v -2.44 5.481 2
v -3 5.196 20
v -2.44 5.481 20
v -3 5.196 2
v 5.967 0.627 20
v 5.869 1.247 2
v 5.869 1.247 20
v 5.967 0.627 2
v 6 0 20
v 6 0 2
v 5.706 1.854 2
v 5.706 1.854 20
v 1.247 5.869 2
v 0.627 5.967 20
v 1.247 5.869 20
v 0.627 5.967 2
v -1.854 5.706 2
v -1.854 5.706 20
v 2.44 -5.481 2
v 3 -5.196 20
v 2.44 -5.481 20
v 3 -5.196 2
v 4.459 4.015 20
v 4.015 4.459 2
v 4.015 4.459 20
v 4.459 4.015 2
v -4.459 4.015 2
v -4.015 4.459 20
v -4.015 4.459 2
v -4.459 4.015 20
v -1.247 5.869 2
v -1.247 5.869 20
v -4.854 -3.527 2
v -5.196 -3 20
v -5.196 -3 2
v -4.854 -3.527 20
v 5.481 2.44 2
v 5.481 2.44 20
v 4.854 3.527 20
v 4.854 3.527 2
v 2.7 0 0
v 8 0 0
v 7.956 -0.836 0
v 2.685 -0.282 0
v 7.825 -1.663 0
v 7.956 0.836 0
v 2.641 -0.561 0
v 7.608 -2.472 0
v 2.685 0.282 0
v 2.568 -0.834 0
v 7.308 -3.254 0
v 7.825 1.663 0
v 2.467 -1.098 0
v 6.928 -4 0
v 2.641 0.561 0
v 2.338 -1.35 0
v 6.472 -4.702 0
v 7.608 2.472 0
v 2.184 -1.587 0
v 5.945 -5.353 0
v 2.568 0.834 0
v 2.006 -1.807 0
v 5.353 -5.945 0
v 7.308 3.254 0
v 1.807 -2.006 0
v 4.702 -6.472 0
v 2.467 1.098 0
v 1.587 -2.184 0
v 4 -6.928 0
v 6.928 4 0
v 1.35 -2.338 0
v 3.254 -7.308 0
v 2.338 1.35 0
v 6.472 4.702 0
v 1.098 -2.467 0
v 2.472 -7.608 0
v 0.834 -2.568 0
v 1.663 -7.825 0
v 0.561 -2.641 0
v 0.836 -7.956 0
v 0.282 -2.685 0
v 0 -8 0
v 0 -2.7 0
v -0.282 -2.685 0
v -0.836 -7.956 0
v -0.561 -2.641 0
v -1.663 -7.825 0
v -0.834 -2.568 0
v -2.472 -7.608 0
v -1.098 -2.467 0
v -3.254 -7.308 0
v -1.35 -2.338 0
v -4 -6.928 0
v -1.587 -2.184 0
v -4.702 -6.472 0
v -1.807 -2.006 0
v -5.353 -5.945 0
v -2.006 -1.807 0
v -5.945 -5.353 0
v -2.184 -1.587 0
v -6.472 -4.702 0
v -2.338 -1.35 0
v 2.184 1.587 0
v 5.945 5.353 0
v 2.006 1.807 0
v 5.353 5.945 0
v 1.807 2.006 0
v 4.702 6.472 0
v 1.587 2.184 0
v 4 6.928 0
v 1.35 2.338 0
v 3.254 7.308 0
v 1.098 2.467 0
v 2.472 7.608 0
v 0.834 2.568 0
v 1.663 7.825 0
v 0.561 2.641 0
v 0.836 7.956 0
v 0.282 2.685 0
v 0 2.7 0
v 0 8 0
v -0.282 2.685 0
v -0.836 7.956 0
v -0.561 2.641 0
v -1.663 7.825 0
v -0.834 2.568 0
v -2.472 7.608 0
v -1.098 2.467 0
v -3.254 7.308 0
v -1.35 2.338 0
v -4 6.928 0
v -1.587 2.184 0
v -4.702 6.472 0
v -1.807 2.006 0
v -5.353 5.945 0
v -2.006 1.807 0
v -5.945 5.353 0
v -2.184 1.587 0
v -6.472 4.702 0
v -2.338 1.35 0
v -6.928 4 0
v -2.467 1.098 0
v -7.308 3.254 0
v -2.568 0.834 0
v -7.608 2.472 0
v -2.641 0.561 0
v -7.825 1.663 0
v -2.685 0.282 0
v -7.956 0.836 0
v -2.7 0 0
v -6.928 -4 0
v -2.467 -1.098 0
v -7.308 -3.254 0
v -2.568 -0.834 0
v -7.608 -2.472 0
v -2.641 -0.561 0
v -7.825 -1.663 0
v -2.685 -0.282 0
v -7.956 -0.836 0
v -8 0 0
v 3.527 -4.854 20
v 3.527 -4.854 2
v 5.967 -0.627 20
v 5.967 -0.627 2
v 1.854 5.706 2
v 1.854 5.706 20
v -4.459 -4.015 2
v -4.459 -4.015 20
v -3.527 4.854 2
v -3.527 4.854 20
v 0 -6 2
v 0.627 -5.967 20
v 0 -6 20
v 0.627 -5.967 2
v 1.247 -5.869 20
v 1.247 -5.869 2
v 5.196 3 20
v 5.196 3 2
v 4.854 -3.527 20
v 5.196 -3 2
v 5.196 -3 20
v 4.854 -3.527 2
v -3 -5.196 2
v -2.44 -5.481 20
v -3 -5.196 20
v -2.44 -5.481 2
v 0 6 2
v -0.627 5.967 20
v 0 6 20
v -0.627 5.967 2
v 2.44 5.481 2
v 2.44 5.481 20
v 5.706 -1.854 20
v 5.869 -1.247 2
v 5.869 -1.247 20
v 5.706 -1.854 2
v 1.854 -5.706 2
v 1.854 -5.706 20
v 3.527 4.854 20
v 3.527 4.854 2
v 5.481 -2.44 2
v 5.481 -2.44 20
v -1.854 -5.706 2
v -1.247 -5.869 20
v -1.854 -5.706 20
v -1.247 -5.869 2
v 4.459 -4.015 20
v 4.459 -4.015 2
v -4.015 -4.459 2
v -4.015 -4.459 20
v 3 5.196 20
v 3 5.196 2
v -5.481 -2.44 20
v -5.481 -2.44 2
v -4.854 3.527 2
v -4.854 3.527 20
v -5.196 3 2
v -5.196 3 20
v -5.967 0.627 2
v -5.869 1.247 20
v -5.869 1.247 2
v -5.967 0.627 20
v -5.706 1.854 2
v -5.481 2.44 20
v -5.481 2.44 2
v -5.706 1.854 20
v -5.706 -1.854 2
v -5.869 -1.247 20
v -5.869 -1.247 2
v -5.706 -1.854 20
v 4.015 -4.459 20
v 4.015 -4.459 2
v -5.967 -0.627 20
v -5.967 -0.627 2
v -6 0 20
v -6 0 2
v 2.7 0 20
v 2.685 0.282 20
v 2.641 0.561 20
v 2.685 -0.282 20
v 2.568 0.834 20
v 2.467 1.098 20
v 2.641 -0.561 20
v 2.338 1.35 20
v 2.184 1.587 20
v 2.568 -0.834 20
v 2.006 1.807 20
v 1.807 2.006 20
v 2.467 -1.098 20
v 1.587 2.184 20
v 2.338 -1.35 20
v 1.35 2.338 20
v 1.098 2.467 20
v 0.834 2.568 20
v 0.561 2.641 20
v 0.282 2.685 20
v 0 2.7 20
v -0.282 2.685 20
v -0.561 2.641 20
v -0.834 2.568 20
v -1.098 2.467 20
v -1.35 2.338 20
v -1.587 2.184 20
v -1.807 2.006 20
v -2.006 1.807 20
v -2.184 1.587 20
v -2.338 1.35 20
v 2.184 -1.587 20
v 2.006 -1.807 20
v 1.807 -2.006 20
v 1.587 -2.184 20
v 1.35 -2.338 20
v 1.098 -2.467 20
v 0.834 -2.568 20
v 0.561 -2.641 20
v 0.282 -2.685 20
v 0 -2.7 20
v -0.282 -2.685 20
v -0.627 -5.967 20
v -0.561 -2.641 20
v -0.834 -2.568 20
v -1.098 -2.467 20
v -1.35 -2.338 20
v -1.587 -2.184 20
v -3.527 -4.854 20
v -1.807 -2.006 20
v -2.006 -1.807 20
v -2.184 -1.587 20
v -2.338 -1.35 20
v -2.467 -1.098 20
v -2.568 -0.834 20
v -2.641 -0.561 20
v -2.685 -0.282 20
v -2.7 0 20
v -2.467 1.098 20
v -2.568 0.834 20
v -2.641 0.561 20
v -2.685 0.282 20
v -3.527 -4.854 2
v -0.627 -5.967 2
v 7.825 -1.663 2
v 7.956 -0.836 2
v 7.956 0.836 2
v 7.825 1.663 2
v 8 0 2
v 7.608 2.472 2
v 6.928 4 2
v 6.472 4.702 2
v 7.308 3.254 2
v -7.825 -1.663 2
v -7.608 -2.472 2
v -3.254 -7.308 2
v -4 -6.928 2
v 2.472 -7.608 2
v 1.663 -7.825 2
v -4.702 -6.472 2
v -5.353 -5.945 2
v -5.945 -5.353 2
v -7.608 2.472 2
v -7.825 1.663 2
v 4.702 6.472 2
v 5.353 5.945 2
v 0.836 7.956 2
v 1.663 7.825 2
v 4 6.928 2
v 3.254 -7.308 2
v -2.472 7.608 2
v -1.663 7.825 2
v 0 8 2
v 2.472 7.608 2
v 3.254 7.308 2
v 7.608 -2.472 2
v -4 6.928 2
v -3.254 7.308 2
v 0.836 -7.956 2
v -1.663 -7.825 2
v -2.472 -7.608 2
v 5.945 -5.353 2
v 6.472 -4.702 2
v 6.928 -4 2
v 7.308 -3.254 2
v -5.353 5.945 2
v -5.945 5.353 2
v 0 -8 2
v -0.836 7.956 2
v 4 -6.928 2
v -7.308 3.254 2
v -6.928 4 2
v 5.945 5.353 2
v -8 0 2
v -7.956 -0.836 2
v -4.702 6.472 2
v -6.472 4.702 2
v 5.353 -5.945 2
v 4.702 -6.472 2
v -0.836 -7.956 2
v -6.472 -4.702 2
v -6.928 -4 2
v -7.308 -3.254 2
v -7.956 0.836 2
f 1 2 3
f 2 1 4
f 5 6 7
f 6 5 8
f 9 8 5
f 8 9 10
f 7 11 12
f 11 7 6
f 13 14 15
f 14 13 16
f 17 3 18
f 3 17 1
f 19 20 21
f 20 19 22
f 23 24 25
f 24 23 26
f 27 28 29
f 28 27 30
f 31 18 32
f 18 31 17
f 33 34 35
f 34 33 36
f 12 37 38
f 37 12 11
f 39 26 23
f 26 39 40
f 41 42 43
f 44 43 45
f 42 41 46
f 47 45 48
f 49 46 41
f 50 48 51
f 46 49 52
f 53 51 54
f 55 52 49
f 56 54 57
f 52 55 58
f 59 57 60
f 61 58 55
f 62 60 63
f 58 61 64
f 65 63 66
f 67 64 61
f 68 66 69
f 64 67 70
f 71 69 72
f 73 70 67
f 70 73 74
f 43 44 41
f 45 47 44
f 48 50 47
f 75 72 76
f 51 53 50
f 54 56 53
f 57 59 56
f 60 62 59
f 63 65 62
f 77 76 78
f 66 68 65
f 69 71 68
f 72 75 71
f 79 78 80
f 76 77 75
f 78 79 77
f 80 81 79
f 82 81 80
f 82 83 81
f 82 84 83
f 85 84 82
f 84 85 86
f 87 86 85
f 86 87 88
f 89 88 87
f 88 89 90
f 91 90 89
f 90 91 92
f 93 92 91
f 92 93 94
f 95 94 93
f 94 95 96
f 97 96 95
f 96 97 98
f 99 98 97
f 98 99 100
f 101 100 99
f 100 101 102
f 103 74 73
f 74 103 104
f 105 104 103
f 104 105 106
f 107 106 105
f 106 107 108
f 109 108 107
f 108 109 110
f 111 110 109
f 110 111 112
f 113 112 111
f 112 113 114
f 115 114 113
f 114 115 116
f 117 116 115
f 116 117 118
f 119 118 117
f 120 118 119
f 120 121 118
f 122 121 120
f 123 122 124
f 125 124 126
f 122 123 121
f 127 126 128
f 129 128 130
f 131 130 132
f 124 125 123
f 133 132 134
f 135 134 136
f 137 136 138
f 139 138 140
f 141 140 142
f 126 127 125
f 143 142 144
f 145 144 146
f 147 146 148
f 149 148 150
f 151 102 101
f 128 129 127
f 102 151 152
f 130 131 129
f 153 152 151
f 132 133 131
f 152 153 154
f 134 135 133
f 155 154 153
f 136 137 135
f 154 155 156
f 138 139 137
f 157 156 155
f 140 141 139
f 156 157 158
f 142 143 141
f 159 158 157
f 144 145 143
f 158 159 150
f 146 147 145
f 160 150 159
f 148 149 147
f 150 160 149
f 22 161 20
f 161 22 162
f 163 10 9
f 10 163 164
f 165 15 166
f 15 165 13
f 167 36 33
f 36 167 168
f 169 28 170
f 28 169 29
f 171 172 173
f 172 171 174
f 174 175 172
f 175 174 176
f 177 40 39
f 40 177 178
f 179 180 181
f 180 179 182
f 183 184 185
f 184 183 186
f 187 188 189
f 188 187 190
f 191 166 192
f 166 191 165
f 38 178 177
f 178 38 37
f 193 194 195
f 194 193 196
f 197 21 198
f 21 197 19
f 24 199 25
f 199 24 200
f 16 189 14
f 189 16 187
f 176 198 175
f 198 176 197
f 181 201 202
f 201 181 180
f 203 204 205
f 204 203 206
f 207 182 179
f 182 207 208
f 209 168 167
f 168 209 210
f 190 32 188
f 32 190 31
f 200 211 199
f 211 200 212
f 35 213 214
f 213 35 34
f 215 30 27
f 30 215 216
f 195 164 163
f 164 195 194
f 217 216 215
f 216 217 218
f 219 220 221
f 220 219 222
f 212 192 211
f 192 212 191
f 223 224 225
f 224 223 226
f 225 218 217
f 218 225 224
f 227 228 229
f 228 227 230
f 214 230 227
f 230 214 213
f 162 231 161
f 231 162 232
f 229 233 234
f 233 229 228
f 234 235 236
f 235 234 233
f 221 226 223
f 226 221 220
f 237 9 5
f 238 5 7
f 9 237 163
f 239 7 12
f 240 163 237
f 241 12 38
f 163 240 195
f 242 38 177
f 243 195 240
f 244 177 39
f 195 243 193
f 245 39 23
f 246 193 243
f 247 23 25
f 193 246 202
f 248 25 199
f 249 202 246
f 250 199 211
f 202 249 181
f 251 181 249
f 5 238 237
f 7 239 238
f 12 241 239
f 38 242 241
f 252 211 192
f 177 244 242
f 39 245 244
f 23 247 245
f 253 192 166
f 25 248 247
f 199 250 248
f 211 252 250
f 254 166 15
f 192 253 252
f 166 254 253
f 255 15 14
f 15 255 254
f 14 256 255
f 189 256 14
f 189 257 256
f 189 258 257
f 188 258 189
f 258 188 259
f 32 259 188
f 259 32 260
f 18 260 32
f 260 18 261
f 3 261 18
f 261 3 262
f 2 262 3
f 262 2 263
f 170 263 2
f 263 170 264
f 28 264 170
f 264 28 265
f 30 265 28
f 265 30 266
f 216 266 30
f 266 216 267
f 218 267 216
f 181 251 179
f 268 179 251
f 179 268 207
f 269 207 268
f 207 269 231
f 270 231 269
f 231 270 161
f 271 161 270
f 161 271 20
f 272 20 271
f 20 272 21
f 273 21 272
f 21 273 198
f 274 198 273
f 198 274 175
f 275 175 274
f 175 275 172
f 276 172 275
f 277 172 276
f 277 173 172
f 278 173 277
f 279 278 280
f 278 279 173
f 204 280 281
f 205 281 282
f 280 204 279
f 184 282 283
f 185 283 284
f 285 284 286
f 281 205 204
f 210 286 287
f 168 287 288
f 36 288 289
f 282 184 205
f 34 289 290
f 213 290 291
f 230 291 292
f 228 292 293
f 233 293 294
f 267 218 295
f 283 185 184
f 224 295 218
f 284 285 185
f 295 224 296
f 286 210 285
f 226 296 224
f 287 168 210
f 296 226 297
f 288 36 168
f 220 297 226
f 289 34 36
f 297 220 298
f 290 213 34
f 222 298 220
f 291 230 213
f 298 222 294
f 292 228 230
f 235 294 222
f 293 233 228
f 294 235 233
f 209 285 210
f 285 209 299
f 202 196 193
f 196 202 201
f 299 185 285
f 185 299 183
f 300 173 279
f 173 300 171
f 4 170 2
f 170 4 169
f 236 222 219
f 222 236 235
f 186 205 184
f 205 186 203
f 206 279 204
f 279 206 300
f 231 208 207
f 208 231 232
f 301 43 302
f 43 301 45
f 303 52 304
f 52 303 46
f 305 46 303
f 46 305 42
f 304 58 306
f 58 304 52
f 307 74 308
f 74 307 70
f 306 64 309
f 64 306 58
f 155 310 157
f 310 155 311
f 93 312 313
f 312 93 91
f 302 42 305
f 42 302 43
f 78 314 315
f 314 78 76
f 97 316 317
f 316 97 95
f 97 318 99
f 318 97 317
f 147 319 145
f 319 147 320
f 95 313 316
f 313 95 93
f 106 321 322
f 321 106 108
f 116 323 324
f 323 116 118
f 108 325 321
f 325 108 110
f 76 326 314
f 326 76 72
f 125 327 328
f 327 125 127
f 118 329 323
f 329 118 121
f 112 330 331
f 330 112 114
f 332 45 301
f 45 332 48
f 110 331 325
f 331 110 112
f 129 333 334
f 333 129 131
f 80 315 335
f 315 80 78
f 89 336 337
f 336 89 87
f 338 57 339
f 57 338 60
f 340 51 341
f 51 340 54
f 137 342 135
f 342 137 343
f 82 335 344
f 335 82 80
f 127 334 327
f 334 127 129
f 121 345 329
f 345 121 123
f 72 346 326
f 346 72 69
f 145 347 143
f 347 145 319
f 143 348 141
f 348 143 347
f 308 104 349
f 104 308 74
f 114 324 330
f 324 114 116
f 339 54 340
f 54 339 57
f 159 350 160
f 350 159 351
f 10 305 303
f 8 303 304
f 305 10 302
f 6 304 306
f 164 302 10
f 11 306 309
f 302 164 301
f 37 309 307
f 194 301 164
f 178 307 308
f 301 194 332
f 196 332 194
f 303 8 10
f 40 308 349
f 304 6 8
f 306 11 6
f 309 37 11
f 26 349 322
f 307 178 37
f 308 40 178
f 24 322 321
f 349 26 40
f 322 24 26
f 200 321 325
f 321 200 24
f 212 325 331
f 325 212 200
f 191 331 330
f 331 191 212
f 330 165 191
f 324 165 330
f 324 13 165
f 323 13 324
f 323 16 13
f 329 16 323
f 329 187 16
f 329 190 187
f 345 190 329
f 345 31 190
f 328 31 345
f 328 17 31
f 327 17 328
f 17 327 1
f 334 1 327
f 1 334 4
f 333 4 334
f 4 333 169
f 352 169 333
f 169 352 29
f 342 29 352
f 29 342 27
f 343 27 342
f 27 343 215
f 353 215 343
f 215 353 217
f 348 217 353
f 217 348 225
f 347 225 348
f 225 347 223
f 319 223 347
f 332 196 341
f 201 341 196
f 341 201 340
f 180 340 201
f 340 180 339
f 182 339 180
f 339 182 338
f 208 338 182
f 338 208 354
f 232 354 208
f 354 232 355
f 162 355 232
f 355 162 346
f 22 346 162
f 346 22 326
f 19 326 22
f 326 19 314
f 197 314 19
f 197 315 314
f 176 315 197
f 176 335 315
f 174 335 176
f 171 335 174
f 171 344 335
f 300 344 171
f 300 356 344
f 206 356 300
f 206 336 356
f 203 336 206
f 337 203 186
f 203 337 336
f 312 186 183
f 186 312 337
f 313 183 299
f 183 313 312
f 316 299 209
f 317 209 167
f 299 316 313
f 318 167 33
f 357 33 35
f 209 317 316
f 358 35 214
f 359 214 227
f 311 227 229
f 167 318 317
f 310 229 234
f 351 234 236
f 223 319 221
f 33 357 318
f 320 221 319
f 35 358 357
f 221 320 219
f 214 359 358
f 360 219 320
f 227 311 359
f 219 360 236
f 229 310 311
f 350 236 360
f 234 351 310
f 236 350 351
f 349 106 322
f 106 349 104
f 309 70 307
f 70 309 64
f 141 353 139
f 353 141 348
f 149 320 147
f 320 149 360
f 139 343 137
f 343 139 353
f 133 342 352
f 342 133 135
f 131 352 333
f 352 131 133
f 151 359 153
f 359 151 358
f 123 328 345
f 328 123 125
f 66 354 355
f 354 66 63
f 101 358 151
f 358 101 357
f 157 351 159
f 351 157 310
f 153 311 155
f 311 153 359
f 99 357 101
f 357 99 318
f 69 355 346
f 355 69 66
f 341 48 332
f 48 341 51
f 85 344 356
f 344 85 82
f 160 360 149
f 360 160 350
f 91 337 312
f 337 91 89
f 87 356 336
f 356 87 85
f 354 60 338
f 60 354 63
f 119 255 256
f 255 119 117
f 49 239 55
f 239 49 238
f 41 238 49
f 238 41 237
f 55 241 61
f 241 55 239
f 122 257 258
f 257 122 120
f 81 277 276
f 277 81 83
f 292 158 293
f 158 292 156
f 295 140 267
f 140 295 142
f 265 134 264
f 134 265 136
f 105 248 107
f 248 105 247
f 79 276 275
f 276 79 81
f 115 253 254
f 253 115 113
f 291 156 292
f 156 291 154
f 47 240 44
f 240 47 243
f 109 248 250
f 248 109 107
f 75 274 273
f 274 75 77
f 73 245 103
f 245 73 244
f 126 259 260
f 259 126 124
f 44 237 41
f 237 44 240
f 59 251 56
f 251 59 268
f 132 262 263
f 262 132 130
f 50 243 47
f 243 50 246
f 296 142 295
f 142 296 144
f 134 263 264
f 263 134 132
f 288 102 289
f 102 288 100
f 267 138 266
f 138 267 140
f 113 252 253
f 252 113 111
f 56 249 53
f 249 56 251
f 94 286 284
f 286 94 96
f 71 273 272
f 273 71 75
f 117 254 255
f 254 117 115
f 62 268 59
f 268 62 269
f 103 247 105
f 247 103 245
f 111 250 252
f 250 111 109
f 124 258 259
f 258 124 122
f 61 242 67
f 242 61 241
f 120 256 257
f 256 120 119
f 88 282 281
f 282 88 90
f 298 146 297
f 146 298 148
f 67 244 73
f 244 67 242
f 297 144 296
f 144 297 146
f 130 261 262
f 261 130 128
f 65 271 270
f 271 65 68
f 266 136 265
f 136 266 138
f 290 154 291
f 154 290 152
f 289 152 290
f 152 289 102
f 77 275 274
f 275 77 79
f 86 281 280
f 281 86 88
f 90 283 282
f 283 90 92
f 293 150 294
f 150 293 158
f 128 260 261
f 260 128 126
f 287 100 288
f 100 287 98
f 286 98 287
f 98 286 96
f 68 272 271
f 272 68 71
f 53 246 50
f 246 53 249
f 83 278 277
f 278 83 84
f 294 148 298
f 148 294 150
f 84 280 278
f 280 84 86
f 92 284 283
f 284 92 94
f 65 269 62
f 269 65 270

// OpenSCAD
// Motor mounting standoff.
$fn = 60;
eps = 0.02;
thread_d = 5.4;
outer_d = 12;
length = 20;
difference() {
    union() { cylinder(d=outer_d,h=length); cylinder(d=outer_d+4,h=2); }
    translate([0,0,-eps]) cylinder(d=thread_d,h=length+2*eps);
}
